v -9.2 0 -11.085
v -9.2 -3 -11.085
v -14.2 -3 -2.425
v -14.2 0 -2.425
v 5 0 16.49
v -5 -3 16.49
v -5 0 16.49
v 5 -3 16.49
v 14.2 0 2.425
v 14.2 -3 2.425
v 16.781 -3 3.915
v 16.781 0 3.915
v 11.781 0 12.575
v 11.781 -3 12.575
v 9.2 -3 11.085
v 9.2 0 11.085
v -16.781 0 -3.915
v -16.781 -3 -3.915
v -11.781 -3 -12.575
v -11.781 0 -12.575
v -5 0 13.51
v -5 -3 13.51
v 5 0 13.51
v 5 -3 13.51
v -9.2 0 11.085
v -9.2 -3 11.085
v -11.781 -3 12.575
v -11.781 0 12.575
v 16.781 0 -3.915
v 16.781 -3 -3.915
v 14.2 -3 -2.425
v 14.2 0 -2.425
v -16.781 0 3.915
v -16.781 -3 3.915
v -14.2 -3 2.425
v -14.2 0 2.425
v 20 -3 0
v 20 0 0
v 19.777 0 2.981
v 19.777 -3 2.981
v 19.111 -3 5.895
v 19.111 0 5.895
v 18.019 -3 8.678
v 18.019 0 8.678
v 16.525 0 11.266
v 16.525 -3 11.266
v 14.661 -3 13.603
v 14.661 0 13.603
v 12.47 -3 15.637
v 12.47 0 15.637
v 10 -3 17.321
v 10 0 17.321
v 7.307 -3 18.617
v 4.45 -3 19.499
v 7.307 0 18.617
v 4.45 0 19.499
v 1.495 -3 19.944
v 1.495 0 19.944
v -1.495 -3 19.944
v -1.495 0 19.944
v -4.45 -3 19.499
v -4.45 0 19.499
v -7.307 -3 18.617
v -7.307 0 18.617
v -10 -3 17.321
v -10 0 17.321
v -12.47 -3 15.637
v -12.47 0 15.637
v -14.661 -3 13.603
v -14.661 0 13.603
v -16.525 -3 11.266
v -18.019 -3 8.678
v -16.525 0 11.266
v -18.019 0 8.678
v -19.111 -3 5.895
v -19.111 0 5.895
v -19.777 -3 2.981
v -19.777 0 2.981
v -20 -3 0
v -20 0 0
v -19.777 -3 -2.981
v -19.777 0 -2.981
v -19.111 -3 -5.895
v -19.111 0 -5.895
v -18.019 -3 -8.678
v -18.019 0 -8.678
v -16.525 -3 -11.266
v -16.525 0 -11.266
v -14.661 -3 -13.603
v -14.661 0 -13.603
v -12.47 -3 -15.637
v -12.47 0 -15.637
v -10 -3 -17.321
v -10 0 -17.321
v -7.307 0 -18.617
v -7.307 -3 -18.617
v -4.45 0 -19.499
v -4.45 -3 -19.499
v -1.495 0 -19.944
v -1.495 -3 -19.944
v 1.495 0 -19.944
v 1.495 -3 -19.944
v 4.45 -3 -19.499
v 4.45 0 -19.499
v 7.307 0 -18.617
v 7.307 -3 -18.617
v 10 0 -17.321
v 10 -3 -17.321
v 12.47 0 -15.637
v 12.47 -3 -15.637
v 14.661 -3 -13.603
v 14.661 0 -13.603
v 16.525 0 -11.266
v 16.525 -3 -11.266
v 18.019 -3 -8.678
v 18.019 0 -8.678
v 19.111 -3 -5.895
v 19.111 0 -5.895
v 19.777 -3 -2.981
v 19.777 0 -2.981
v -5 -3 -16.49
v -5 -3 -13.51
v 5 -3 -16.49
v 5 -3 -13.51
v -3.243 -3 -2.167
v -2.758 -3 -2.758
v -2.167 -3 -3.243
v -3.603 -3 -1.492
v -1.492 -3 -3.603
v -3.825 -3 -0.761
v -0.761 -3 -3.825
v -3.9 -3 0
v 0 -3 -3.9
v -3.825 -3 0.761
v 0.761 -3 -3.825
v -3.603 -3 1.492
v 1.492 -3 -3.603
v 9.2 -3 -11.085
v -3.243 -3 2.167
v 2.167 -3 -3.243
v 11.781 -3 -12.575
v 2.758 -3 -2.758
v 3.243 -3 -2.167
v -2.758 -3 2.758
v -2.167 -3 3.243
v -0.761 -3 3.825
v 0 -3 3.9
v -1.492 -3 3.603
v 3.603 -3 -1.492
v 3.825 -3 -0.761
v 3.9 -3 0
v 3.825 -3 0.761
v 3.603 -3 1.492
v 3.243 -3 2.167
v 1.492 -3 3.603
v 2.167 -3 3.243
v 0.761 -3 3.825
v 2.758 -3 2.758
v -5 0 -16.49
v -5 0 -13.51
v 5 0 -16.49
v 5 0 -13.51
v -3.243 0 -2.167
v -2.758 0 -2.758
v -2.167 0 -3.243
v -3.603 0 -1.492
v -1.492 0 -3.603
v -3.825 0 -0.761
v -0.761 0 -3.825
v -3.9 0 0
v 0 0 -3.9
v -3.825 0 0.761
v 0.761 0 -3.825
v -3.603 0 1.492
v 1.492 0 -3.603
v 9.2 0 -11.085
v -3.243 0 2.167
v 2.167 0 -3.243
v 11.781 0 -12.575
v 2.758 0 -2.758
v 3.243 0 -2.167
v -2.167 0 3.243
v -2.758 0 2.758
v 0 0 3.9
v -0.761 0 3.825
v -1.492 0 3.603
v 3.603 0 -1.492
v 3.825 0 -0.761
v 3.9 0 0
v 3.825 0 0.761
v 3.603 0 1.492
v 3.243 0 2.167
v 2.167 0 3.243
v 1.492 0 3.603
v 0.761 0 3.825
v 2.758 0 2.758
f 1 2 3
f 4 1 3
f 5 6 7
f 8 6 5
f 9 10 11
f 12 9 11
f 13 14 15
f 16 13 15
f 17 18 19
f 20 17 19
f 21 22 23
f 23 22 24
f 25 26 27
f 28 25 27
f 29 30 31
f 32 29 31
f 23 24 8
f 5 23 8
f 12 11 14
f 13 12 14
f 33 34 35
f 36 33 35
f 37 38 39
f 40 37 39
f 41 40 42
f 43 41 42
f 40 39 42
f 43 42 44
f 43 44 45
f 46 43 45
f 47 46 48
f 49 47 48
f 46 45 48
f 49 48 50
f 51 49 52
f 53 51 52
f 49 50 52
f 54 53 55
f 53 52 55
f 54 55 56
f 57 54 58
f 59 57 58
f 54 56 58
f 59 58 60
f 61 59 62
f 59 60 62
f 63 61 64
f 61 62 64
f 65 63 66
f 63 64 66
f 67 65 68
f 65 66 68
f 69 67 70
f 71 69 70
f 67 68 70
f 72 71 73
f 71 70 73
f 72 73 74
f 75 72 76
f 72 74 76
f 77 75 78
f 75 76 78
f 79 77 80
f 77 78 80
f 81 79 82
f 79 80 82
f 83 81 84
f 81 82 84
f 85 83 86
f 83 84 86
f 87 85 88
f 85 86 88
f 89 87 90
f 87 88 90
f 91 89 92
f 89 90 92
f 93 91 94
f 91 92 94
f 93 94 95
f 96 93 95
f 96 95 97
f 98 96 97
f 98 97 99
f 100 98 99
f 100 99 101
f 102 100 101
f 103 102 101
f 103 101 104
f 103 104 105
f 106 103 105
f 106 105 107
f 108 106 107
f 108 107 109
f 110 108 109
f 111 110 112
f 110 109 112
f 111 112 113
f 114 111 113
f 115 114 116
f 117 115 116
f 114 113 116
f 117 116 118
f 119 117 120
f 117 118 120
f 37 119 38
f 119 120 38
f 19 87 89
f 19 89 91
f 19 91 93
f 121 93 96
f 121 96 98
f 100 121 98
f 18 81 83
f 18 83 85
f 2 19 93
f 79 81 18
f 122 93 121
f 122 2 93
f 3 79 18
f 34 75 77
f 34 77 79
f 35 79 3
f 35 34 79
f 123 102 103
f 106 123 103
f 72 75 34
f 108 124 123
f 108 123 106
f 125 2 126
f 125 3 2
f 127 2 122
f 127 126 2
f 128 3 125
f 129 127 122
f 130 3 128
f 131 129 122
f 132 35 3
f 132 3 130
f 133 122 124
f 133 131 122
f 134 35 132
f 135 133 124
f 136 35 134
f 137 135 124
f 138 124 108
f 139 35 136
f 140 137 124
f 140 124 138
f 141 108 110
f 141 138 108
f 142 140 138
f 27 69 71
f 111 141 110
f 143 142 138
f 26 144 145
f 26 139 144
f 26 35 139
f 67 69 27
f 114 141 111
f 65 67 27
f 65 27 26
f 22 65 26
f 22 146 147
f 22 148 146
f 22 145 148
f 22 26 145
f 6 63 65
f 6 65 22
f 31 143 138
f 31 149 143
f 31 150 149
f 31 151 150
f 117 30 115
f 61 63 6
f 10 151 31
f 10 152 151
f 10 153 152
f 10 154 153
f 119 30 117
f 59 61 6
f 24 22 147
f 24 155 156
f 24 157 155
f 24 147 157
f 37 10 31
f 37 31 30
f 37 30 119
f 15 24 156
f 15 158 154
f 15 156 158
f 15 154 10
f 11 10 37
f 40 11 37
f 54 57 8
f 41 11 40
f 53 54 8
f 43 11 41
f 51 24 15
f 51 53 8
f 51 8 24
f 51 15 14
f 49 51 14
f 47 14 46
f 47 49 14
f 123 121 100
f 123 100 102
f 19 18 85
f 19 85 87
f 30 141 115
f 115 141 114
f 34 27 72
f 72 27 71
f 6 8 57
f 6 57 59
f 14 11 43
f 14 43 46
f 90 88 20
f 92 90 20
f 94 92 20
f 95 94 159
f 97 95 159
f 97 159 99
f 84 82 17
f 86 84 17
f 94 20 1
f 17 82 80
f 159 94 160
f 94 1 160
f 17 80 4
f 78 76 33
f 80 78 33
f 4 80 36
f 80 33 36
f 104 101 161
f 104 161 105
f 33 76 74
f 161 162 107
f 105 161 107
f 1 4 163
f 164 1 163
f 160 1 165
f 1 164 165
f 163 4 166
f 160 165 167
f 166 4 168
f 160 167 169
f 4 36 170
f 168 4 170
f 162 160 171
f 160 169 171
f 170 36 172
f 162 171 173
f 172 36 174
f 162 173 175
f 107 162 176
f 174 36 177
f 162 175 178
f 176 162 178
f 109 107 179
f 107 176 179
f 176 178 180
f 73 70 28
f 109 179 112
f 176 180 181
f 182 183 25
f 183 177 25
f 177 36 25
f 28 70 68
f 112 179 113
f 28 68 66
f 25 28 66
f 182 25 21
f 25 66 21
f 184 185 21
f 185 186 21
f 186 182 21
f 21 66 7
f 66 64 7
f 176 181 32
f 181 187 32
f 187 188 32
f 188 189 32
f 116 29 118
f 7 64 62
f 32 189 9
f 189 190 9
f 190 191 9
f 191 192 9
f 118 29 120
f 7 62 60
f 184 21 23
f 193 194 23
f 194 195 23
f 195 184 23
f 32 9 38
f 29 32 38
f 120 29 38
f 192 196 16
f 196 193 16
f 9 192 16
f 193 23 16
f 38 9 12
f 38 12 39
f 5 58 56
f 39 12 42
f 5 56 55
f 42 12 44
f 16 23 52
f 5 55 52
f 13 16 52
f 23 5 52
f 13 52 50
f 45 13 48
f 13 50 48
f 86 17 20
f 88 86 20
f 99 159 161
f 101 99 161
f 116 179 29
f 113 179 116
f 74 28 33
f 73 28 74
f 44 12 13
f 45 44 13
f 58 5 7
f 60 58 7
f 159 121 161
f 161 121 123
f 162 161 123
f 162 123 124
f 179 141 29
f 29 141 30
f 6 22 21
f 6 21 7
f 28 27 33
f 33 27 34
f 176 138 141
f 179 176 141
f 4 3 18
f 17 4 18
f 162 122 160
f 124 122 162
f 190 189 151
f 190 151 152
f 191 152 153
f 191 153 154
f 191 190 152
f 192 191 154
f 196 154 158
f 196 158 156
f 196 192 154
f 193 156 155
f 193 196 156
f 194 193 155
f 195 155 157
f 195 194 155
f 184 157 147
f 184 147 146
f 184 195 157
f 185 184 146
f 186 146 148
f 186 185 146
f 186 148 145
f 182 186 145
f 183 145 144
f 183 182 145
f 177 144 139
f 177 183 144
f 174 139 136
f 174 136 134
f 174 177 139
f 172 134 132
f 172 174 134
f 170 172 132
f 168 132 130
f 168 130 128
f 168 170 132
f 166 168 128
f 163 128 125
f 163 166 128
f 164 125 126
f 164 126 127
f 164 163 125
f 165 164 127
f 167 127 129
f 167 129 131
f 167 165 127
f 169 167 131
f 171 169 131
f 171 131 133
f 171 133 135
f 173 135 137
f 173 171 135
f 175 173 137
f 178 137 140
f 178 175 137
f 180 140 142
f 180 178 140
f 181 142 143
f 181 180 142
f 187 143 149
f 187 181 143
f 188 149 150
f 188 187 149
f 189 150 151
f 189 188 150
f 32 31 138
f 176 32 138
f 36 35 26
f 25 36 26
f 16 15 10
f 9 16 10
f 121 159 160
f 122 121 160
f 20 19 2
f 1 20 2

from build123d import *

# Parameters (mm, degrees)
F0_R     = 20
F0_R_2   = 3.9
F1_DEPTH = 3
F2_W     = 10
F2_H     = 2.98
F3_DEPTH = 25


with BuildPart() as f1:
    # F0 (on Front) → F1 (new body)
    with BuildSketch(Plane.XZ):
        Circle(F0_R)
        Circle(F0_R_2, mode=Mode.SUBTRACT)
    extrude(amount=F1_DEPTH)

    # F2 (on face) → F3 (cut)
    with BuildSketch(Plane.XZ.offset(3)):
        with Locations((0, -15)):
            Rectangle(F2_W, F2_H)
        Polygon((14.200003, -2.424873), (9.200003, -11.085127), (11.780759, -12.575127), (16.780759, -3.914873), align=None)
        Polygon((9.200003, 11.085127), (14.200003, 2.424873), (16.780759, 3.914873), (11.780759, 12.575127), align=None)
        with Locations((0, 15)):
            Rectangle(F2_W, F2_H)
        Polygon((-14.200003, 2.424873), (-9.200003, 11.085127), (-11.780759, 12.575127), (-16.780759, 3.914873), align=None)
        Polygon((-9.200003, -11.085127), (-14.200003, -2.424873), (-16.780759, -3.914873), (-11.780759, -12.575127), align=None)
    extrude(amount=-F3_DEPTH, mode=Mode.SUBTRACT)


solid = f1.part
